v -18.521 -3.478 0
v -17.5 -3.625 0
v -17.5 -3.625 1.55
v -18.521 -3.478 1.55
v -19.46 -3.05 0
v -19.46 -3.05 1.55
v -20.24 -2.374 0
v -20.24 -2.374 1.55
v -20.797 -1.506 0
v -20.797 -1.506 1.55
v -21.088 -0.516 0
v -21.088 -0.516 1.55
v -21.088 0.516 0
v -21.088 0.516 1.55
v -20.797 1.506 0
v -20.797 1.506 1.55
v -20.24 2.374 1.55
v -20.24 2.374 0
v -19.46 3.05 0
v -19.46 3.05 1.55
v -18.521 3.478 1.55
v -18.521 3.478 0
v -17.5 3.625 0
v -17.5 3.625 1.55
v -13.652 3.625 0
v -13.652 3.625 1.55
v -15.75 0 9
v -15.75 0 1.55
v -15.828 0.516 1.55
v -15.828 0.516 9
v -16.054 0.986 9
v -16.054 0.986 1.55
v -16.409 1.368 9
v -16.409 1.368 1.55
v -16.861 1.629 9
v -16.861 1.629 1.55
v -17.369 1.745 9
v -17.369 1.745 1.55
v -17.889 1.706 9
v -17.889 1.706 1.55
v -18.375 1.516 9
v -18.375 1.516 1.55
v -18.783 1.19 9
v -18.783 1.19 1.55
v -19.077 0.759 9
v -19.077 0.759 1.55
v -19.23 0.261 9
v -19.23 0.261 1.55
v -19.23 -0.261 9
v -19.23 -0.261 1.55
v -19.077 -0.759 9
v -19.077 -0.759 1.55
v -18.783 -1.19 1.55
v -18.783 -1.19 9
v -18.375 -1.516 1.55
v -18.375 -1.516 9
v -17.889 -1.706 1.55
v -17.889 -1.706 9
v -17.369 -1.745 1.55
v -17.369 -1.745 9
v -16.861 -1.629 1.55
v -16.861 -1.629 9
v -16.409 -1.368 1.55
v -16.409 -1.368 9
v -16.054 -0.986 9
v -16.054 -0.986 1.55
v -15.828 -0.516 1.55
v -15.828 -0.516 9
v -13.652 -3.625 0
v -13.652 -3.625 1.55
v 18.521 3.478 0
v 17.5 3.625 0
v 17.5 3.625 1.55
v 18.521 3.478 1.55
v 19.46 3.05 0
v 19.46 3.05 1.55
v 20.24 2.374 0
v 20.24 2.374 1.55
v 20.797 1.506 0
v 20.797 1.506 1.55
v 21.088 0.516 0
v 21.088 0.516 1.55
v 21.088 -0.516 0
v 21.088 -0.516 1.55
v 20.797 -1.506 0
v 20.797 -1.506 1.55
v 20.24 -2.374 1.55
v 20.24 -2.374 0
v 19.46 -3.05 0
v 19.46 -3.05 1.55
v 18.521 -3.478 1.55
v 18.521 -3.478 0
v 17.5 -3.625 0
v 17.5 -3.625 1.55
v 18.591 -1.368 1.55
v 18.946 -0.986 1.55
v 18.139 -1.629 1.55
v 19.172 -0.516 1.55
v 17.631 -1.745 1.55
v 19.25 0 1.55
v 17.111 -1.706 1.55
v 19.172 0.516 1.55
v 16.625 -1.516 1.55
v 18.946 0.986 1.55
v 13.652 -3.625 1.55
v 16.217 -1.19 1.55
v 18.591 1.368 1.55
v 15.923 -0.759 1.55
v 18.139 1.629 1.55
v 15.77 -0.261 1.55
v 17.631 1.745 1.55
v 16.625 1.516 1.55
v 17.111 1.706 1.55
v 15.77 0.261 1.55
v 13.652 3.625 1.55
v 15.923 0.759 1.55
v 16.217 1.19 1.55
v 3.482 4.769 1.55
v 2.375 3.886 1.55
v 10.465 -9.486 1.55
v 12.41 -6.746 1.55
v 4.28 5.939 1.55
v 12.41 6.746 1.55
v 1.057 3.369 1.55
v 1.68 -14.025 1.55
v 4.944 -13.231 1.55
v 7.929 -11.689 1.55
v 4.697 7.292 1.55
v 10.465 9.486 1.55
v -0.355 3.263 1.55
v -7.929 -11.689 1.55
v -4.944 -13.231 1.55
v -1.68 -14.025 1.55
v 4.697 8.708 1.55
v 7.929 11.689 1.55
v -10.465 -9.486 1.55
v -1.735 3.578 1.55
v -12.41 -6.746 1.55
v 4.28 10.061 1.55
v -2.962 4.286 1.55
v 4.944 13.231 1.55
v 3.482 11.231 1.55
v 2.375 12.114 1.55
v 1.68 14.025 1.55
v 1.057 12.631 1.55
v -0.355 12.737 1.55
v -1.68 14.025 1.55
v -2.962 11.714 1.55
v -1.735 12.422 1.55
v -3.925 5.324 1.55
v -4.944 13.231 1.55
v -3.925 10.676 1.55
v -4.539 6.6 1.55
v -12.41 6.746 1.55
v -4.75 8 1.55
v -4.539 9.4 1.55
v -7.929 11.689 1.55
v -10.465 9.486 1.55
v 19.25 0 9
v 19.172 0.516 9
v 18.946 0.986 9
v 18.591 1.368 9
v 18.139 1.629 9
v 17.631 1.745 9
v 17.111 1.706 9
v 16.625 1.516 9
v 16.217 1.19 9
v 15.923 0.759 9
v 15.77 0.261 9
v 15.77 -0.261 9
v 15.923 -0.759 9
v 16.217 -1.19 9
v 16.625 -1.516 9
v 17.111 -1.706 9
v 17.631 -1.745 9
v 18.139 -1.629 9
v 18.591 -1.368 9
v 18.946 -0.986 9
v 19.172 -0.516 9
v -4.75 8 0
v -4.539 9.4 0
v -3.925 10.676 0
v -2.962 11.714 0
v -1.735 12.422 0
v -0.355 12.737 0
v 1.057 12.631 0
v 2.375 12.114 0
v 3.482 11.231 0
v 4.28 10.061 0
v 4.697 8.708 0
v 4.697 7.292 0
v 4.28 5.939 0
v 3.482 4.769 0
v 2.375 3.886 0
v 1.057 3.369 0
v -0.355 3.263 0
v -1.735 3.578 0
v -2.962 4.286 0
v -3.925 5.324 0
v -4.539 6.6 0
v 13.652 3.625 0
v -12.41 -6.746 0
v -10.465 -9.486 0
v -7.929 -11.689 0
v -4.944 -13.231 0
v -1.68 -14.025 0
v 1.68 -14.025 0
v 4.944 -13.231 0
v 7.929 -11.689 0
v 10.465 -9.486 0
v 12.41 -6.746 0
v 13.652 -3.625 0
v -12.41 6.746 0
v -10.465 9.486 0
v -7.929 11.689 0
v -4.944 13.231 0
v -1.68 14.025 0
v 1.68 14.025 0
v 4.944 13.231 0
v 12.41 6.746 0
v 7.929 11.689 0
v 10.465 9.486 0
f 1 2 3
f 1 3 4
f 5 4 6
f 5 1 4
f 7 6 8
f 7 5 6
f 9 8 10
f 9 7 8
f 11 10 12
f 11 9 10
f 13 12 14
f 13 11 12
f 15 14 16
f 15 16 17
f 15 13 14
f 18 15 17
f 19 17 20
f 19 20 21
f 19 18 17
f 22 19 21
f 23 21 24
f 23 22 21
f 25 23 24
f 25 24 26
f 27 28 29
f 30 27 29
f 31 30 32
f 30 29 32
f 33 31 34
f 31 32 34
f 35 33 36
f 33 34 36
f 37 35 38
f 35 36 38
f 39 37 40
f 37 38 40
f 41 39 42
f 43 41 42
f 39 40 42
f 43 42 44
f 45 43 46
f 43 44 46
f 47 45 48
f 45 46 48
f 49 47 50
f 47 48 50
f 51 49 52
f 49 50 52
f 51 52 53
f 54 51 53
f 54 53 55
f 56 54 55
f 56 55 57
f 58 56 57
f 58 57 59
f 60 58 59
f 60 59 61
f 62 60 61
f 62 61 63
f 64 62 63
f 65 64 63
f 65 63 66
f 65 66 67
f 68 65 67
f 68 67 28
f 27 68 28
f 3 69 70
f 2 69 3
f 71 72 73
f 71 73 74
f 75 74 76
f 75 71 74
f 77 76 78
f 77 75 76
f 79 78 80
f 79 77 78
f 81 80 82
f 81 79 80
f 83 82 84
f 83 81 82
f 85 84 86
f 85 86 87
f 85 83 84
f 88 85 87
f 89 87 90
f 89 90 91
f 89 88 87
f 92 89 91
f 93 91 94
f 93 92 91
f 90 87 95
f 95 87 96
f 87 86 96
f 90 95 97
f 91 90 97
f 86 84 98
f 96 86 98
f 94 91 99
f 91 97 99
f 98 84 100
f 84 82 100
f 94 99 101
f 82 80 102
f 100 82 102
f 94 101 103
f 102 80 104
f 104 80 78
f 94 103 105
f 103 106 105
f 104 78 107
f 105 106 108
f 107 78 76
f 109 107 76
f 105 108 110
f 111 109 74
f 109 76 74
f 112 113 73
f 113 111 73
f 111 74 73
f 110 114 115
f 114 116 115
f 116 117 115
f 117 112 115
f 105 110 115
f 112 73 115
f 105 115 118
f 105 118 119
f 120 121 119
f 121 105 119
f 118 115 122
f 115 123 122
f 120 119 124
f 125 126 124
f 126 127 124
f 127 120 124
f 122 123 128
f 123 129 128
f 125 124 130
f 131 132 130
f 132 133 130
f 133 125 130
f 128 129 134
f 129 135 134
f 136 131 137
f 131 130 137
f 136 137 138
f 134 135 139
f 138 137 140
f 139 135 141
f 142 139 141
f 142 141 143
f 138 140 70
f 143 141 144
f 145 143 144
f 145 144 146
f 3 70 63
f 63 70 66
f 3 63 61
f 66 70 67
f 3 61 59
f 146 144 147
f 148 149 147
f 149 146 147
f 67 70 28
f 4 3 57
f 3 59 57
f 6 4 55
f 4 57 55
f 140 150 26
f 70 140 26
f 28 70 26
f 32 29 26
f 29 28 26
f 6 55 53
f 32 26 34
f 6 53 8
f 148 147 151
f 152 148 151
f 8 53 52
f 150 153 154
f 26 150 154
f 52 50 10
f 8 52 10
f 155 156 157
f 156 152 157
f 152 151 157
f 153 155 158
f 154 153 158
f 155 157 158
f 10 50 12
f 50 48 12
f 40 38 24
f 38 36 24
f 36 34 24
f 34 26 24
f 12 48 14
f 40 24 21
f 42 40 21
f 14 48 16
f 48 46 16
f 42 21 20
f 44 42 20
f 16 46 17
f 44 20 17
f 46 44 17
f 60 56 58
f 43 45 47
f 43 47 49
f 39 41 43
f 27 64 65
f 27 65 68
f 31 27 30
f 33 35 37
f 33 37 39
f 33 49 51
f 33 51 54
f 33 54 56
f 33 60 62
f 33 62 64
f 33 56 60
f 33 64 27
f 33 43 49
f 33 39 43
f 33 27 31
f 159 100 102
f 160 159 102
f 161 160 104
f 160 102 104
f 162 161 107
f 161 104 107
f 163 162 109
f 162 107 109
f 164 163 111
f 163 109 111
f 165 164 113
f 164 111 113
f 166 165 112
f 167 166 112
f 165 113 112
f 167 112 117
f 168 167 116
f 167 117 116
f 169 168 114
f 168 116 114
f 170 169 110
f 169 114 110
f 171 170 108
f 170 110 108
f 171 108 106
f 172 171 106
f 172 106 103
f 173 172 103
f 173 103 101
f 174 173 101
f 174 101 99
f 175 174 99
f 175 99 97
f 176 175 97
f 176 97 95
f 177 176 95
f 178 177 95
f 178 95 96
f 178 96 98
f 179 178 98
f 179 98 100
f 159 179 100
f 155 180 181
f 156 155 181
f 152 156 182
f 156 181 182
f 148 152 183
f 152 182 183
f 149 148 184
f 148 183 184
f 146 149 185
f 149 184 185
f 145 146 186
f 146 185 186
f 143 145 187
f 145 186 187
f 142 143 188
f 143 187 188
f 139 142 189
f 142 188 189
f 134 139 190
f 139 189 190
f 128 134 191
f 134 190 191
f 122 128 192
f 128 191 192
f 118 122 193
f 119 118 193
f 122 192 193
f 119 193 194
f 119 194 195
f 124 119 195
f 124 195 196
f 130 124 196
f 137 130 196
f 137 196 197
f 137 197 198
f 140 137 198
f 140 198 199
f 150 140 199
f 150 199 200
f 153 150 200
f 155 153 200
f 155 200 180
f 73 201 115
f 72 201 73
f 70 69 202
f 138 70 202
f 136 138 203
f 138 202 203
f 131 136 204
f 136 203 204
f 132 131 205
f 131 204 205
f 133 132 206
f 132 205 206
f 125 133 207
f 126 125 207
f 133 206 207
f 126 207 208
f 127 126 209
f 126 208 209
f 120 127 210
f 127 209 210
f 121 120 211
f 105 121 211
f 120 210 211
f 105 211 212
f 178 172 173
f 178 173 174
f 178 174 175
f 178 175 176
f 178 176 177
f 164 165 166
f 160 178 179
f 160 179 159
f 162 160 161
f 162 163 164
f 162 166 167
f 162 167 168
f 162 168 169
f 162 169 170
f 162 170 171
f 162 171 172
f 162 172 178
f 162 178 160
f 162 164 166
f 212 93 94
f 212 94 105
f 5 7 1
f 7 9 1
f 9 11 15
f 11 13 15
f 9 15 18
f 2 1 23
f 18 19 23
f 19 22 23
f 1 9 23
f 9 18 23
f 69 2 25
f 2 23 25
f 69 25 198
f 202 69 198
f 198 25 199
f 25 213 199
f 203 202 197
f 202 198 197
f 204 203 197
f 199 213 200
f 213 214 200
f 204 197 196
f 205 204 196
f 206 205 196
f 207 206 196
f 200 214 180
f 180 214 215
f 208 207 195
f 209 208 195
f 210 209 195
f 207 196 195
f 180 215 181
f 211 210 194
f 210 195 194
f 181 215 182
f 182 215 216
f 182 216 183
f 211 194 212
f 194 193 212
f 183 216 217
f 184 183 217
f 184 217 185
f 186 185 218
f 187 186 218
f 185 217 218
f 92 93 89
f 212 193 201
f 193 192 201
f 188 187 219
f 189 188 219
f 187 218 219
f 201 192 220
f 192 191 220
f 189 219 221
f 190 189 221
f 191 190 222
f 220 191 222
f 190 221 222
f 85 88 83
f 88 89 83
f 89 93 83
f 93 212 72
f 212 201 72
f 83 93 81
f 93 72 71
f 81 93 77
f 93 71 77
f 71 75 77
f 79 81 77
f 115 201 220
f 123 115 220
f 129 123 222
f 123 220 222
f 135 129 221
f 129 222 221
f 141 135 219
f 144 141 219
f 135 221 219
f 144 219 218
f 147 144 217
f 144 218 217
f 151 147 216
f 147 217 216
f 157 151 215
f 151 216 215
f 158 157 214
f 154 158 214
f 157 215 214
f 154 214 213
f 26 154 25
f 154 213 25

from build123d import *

# Parameters (mm, degrees)
SKETCH1_R           = 14.125
BOSS_EXTRUDE1_DEPTH = 1.55
BOSS_EXTRUDE2_DEPTH = 1.55
SKETCH4_R           = 1.75
BOSS_EXTRUDE3_DEPTH = 9
CUT_EXTRUDE1_REACH  = 28.959
SKETCH5_R           = 4.75


with BuildPart() as part:
    # Sketch1 → Boss-Extrude1 (new body)
    with BuildSketch(Plane.XY):
        with Locations(Location((0, 0, 0), (0, 0, 180))):
            Circle(SKETCH1_R)
    extrude(amount=BOSS_EXTRUDE1_DEPTH)

    # Sketch2 → Boss-Extrude2 (add)
    with BuildSketch(Plane.XY):
        with BuildLine():
            Line((-17.5, 3.625), (17.5, 3.625))
            ThreePointArc((17.5, 3.625), (21.125, 0), (17.5, -3.625))
            Line((17.5, -3.625), (-17.5, -3.625))
            ThreePointArc((-17.5, -3.625), (-21.125, 0), (-17.5, 3.625))
        make_face()
    extrude(amount=BOSS_EXTRUDE2_DEPTH)

    # Sketch4 → Boss-Extrude3 (add)
    with BuildSketch(Plane.XY):
        with Locations((-17.5, 0)):
            Circle(SKETCH4_R)
        with Locations((17.5, 0)):
            Circle(SKETCH4_R)
    extrude(amount=BOSS_EXTRUDE3_DEPTH)

    # Sketch5 → Cut-Extrude1 (cut, up to next)
    with BuildSketch(Plane(origin=(0, 0, 0), x_dir=(-1, 0, 0), z_dir=(0, 0, -1)), mode=Mode.PRIVATE) as cut_extrude1_sk1:
        with Locations((0, 8)):
            Circle(SKETCH5_R)
    cut_extrude1_tool1 = extrude(cut_extrude1_sk1.sketch, amount=-CUT_EXTRUDE1_REACH, mode=Mode.PRIVATE) & part.part
    add(cut_extrude1_tool1.solids().sort_by_distance((0, 8, 0))[0], mode=Mode.SUBTRACT)


solid = part.part
